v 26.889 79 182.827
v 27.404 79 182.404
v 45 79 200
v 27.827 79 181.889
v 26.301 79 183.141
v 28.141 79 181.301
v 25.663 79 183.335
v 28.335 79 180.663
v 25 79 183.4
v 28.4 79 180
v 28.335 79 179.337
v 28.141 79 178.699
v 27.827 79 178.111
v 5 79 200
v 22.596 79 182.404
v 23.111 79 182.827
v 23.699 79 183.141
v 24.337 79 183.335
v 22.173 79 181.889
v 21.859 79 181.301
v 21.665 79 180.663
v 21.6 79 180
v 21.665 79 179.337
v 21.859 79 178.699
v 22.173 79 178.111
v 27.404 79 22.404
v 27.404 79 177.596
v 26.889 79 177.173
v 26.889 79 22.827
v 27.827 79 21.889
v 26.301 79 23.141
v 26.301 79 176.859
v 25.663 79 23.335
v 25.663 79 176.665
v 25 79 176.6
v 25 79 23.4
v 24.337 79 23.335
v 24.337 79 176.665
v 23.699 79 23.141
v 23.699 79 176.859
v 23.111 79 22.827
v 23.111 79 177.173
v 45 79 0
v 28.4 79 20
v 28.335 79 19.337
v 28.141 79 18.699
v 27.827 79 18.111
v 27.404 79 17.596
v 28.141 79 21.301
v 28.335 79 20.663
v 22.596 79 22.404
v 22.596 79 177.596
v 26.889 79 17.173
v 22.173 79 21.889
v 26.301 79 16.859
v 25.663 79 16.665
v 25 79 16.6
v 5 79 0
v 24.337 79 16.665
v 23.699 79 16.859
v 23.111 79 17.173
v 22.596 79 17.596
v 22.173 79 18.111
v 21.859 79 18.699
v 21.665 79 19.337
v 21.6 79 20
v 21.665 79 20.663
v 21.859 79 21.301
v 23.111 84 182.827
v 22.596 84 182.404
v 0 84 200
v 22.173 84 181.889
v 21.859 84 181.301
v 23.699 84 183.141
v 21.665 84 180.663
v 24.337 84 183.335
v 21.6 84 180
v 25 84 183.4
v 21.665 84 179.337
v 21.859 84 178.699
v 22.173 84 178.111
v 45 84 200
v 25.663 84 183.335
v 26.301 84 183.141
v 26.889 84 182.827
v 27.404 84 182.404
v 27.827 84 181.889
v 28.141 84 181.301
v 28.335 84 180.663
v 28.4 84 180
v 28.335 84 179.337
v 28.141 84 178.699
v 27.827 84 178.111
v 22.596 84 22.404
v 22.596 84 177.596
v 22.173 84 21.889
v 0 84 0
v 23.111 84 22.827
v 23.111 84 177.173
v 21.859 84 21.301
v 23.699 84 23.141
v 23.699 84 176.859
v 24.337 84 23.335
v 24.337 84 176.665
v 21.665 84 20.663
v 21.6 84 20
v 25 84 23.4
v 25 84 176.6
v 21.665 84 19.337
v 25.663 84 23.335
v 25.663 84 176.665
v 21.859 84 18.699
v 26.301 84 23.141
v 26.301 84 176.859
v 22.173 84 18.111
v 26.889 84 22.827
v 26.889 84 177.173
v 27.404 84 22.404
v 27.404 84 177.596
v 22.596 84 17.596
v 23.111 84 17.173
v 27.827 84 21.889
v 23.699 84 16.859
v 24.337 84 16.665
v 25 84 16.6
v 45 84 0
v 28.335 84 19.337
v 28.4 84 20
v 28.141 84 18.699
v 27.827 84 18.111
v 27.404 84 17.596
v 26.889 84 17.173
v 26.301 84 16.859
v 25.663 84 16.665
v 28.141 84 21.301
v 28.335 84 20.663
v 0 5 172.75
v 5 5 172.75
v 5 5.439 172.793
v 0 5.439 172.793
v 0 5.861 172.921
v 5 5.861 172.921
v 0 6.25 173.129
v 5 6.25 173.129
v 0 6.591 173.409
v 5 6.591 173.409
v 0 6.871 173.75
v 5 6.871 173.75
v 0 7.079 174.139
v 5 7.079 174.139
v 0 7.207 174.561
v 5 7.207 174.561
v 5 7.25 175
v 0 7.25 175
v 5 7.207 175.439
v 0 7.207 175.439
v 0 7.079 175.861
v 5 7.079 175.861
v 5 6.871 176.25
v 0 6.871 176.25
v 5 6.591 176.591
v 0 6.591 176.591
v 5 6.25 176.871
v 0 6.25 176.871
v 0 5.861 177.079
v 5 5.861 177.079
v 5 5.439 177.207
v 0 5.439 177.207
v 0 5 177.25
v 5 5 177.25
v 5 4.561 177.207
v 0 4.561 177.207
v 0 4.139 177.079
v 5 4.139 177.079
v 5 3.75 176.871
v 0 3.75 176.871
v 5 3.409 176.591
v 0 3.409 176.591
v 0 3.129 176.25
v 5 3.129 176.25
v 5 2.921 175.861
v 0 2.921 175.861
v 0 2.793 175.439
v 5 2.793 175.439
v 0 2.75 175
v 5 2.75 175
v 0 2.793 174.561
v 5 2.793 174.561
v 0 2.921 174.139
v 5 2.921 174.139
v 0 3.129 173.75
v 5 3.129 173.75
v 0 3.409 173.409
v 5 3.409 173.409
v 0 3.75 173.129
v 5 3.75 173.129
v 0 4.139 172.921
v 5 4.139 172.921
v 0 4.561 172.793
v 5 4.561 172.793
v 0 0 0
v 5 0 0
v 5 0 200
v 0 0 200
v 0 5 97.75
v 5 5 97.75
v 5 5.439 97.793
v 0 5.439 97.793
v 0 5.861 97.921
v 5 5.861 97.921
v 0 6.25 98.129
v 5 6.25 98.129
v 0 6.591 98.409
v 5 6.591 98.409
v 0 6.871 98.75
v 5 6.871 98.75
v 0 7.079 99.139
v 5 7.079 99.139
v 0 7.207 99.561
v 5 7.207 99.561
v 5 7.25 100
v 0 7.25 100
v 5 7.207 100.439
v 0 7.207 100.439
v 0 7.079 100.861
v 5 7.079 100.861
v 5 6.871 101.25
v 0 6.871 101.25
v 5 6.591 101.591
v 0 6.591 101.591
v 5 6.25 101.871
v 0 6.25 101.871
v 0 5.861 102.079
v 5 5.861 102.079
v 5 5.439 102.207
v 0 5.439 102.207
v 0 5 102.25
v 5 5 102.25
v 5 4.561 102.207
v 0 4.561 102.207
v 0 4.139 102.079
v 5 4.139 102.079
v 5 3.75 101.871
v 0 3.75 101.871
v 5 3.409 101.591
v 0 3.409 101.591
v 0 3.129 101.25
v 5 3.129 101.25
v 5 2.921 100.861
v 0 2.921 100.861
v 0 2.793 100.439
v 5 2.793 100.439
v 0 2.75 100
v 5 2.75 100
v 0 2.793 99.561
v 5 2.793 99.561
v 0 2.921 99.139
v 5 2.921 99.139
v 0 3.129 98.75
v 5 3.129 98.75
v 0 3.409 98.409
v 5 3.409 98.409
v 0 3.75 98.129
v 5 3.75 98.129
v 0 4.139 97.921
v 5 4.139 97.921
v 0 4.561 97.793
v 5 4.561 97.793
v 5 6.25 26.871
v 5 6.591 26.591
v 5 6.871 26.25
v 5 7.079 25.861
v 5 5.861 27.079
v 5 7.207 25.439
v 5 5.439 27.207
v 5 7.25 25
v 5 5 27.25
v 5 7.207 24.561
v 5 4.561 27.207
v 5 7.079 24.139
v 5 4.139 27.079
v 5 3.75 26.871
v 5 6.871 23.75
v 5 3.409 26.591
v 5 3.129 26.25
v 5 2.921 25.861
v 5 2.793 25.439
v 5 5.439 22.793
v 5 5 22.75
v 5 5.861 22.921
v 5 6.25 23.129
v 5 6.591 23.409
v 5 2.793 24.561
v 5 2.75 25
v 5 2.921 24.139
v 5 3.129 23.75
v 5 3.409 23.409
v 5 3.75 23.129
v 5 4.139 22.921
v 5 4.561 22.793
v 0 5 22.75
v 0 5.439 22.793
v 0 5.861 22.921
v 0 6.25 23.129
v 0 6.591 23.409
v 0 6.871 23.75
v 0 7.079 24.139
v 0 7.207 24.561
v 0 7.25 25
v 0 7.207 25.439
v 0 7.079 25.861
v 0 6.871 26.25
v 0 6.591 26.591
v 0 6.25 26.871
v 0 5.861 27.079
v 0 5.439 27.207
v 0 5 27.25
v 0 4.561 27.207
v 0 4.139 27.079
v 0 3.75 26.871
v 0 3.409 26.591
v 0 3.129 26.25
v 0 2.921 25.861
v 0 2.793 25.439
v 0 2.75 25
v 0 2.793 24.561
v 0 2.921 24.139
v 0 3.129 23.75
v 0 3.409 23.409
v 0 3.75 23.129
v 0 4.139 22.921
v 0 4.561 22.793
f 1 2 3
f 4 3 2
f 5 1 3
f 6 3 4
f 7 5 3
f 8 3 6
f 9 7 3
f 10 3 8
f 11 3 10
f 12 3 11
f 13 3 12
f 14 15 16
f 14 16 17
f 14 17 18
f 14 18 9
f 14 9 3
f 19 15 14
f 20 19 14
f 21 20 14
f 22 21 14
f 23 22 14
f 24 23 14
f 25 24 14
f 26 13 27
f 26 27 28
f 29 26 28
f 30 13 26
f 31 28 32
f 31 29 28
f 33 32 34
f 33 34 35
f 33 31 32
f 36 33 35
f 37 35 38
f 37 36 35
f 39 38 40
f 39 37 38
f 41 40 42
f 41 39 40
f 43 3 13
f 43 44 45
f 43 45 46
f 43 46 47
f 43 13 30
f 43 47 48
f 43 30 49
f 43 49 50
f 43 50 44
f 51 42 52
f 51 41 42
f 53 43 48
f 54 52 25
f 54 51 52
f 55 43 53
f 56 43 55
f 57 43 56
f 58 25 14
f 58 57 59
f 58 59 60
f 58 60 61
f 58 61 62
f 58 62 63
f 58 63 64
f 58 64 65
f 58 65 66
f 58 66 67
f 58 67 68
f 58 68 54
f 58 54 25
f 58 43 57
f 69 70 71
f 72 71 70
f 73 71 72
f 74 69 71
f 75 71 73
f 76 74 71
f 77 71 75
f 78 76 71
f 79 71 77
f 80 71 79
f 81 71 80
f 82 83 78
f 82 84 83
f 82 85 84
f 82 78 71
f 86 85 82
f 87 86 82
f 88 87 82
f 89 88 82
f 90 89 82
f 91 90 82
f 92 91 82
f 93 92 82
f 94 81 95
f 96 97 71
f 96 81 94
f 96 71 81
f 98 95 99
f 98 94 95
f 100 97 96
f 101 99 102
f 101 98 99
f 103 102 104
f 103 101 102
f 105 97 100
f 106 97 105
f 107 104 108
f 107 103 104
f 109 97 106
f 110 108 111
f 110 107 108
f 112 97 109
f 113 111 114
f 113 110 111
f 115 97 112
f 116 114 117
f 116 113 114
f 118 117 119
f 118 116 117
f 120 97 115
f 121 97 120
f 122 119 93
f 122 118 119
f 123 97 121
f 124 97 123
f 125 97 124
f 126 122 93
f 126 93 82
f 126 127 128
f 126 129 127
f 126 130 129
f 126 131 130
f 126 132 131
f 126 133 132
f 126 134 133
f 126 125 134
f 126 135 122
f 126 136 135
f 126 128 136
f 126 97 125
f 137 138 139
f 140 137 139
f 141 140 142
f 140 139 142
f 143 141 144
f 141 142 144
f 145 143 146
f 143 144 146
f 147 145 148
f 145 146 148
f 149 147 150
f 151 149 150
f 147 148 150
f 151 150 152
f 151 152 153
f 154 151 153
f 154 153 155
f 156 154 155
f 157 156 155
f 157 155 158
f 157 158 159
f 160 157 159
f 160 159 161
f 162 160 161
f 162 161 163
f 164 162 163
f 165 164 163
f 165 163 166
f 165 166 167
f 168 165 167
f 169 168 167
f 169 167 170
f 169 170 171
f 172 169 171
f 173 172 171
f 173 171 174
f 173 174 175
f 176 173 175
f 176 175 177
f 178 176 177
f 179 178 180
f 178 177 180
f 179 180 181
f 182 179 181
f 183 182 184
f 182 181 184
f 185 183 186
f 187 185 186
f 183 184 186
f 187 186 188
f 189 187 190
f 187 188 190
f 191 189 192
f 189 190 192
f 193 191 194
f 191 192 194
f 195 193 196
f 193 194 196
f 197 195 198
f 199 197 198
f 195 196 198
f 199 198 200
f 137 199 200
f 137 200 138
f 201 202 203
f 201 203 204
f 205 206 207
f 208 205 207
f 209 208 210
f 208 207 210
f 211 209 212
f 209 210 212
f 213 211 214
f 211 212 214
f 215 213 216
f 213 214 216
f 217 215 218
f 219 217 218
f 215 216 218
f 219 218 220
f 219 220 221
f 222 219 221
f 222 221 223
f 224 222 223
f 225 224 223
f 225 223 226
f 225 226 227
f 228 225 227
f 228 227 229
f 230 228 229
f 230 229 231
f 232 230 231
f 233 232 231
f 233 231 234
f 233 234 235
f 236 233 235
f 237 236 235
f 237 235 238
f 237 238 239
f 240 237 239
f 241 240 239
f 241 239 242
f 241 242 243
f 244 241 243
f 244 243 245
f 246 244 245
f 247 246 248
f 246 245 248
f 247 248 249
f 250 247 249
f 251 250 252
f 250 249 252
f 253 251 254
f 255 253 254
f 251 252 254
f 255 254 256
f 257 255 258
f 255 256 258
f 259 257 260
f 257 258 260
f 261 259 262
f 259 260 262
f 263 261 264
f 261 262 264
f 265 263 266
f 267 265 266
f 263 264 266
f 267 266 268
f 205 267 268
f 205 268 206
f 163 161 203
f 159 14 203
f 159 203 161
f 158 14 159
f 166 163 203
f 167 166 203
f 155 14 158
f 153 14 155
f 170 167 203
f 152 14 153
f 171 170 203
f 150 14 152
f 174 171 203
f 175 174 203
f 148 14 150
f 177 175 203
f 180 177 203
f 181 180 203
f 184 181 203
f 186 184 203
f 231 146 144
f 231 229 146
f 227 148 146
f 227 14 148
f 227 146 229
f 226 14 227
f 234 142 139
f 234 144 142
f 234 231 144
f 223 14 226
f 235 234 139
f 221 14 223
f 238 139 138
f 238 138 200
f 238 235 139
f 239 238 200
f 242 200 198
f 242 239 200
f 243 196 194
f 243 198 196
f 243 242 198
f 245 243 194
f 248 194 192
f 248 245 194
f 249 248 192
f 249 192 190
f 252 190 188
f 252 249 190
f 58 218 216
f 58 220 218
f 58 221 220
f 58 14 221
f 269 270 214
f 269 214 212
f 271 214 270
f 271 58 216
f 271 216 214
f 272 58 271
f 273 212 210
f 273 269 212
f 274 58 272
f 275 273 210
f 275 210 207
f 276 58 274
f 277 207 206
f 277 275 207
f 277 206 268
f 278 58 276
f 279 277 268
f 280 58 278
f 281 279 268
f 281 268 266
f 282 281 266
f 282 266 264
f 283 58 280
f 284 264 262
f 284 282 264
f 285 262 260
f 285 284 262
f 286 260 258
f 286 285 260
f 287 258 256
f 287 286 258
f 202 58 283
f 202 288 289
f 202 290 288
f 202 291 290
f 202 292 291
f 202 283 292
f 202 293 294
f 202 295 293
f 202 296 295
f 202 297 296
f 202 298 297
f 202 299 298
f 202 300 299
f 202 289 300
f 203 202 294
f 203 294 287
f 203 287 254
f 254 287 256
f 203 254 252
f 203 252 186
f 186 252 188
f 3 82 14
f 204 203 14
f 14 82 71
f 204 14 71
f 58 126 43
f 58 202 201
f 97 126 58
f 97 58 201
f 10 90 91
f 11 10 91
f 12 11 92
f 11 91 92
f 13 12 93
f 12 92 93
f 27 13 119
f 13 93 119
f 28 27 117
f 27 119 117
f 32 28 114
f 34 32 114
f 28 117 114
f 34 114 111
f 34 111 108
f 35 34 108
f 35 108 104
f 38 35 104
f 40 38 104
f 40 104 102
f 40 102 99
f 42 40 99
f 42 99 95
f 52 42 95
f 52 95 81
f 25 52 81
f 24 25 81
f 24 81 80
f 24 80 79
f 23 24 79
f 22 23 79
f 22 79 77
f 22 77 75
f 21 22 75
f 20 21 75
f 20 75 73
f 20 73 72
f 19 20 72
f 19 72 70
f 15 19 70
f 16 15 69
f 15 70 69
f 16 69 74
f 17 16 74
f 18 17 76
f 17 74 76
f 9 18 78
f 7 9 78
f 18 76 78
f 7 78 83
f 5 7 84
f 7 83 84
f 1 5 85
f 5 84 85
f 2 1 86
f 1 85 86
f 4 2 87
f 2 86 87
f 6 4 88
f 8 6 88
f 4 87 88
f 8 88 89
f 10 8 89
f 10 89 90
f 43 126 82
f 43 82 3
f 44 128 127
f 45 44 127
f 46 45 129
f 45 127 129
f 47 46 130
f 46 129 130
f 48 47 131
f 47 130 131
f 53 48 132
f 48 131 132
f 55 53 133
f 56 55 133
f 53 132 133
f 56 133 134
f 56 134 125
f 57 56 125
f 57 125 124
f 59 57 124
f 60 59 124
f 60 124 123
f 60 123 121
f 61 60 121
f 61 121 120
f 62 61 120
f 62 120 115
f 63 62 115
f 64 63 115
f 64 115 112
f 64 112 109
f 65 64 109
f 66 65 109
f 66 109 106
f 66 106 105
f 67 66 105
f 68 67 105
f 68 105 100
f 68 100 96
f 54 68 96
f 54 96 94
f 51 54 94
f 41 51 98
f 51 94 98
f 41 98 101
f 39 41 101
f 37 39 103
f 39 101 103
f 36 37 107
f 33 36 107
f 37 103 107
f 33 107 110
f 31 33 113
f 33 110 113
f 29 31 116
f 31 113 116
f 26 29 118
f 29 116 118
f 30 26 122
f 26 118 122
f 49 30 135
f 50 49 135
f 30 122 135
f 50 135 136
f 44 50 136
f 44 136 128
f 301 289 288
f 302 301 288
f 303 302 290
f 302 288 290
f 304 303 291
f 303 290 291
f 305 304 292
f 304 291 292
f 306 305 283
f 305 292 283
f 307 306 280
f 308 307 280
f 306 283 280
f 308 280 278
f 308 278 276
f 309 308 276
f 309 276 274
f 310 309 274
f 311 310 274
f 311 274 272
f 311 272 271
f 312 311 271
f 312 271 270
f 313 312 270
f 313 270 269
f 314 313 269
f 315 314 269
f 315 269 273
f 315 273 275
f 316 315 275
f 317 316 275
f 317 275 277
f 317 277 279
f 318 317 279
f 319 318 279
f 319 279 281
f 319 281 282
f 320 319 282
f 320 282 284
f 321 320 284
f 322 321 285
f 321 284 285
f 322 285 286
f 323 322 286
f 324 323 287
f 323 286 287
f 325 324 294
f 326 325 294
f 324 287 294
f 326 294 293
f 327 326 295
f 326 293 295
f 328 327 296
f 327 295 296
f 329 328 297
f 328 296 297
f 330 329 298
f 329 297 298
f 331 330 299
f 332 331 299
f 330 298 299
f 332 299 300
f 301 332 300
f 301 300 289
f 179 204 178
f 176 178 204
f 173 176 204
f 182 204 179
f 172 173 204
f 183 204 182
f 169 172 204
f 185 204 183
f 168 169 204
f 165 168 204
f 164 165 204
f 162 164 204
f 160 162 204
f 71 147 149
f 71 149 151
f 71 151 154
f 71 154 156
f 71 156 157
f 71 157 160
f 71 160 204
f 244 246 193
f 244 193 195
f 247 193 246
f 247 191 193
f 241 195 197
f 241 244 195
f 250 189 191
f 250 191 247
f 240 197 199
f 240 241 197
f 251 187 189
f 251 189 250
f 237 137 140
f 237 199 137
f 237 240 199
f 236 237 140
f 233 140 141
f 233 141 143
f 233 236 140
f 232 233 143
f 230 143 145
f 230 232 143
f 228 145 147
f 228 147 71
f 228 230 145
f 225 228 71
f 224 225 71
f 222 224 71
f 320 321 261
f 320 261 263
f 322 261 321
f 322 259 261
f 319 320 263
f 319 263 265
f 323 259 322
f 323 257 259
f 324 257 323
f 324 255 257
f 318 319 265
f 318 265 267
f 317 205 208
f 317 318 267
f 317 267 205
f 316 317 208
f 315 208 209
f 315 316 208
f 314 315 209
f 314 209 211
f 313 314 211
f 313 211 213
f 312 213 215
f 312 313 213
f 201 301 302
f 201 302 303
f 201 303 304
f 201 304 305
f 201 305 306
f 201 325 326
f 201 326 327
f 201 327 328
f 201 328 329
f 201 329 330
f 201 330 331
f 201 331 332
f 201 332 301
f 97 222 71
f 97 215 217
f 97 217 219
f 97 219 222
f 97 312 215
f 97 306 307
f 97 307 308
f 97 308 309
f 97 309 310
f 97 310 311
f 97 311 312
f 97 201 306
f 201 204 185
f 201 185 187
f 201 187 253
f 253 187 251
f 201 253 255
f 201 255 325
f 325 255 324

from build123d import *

# Parameters (mm, degrees)
BOSS_EXTRU_1_DEPTH = 200
TROU_TARAUD_M81_D  = 6.8
D_GAGEMENT_M41_D   = 4.5


with BuildPart() as part:
    # Esquisse1 → Boss.-Extru.1 (new body)
    with BuildSketch(Plane.XY):
        Polygon((0, 0), (0, 84), (45, 84), (45, 79), (5, 79), (5, 0), align=None)
    extrude(amount=BOSS_EXTRU_1_DEPTH)

    # Trou taraudé M81 (through all)
    with Locations(Plane(origin=(0, 79, 0), x_dir=(-1, 0, 0), z_dir=(0, -1, 0))):
        with Locations((-25, -180), (-25, -20)):
            Hole(TROU_TARAUD_M81_D / 2)

    # Dégagement M41 (through all)
    with Locations(Plane.ZY):
        with Locations((175, 5), (100, 5), (25, 5)):
            Hole(D_GAGEMENT_M41_D / 2)


solid = part.part
